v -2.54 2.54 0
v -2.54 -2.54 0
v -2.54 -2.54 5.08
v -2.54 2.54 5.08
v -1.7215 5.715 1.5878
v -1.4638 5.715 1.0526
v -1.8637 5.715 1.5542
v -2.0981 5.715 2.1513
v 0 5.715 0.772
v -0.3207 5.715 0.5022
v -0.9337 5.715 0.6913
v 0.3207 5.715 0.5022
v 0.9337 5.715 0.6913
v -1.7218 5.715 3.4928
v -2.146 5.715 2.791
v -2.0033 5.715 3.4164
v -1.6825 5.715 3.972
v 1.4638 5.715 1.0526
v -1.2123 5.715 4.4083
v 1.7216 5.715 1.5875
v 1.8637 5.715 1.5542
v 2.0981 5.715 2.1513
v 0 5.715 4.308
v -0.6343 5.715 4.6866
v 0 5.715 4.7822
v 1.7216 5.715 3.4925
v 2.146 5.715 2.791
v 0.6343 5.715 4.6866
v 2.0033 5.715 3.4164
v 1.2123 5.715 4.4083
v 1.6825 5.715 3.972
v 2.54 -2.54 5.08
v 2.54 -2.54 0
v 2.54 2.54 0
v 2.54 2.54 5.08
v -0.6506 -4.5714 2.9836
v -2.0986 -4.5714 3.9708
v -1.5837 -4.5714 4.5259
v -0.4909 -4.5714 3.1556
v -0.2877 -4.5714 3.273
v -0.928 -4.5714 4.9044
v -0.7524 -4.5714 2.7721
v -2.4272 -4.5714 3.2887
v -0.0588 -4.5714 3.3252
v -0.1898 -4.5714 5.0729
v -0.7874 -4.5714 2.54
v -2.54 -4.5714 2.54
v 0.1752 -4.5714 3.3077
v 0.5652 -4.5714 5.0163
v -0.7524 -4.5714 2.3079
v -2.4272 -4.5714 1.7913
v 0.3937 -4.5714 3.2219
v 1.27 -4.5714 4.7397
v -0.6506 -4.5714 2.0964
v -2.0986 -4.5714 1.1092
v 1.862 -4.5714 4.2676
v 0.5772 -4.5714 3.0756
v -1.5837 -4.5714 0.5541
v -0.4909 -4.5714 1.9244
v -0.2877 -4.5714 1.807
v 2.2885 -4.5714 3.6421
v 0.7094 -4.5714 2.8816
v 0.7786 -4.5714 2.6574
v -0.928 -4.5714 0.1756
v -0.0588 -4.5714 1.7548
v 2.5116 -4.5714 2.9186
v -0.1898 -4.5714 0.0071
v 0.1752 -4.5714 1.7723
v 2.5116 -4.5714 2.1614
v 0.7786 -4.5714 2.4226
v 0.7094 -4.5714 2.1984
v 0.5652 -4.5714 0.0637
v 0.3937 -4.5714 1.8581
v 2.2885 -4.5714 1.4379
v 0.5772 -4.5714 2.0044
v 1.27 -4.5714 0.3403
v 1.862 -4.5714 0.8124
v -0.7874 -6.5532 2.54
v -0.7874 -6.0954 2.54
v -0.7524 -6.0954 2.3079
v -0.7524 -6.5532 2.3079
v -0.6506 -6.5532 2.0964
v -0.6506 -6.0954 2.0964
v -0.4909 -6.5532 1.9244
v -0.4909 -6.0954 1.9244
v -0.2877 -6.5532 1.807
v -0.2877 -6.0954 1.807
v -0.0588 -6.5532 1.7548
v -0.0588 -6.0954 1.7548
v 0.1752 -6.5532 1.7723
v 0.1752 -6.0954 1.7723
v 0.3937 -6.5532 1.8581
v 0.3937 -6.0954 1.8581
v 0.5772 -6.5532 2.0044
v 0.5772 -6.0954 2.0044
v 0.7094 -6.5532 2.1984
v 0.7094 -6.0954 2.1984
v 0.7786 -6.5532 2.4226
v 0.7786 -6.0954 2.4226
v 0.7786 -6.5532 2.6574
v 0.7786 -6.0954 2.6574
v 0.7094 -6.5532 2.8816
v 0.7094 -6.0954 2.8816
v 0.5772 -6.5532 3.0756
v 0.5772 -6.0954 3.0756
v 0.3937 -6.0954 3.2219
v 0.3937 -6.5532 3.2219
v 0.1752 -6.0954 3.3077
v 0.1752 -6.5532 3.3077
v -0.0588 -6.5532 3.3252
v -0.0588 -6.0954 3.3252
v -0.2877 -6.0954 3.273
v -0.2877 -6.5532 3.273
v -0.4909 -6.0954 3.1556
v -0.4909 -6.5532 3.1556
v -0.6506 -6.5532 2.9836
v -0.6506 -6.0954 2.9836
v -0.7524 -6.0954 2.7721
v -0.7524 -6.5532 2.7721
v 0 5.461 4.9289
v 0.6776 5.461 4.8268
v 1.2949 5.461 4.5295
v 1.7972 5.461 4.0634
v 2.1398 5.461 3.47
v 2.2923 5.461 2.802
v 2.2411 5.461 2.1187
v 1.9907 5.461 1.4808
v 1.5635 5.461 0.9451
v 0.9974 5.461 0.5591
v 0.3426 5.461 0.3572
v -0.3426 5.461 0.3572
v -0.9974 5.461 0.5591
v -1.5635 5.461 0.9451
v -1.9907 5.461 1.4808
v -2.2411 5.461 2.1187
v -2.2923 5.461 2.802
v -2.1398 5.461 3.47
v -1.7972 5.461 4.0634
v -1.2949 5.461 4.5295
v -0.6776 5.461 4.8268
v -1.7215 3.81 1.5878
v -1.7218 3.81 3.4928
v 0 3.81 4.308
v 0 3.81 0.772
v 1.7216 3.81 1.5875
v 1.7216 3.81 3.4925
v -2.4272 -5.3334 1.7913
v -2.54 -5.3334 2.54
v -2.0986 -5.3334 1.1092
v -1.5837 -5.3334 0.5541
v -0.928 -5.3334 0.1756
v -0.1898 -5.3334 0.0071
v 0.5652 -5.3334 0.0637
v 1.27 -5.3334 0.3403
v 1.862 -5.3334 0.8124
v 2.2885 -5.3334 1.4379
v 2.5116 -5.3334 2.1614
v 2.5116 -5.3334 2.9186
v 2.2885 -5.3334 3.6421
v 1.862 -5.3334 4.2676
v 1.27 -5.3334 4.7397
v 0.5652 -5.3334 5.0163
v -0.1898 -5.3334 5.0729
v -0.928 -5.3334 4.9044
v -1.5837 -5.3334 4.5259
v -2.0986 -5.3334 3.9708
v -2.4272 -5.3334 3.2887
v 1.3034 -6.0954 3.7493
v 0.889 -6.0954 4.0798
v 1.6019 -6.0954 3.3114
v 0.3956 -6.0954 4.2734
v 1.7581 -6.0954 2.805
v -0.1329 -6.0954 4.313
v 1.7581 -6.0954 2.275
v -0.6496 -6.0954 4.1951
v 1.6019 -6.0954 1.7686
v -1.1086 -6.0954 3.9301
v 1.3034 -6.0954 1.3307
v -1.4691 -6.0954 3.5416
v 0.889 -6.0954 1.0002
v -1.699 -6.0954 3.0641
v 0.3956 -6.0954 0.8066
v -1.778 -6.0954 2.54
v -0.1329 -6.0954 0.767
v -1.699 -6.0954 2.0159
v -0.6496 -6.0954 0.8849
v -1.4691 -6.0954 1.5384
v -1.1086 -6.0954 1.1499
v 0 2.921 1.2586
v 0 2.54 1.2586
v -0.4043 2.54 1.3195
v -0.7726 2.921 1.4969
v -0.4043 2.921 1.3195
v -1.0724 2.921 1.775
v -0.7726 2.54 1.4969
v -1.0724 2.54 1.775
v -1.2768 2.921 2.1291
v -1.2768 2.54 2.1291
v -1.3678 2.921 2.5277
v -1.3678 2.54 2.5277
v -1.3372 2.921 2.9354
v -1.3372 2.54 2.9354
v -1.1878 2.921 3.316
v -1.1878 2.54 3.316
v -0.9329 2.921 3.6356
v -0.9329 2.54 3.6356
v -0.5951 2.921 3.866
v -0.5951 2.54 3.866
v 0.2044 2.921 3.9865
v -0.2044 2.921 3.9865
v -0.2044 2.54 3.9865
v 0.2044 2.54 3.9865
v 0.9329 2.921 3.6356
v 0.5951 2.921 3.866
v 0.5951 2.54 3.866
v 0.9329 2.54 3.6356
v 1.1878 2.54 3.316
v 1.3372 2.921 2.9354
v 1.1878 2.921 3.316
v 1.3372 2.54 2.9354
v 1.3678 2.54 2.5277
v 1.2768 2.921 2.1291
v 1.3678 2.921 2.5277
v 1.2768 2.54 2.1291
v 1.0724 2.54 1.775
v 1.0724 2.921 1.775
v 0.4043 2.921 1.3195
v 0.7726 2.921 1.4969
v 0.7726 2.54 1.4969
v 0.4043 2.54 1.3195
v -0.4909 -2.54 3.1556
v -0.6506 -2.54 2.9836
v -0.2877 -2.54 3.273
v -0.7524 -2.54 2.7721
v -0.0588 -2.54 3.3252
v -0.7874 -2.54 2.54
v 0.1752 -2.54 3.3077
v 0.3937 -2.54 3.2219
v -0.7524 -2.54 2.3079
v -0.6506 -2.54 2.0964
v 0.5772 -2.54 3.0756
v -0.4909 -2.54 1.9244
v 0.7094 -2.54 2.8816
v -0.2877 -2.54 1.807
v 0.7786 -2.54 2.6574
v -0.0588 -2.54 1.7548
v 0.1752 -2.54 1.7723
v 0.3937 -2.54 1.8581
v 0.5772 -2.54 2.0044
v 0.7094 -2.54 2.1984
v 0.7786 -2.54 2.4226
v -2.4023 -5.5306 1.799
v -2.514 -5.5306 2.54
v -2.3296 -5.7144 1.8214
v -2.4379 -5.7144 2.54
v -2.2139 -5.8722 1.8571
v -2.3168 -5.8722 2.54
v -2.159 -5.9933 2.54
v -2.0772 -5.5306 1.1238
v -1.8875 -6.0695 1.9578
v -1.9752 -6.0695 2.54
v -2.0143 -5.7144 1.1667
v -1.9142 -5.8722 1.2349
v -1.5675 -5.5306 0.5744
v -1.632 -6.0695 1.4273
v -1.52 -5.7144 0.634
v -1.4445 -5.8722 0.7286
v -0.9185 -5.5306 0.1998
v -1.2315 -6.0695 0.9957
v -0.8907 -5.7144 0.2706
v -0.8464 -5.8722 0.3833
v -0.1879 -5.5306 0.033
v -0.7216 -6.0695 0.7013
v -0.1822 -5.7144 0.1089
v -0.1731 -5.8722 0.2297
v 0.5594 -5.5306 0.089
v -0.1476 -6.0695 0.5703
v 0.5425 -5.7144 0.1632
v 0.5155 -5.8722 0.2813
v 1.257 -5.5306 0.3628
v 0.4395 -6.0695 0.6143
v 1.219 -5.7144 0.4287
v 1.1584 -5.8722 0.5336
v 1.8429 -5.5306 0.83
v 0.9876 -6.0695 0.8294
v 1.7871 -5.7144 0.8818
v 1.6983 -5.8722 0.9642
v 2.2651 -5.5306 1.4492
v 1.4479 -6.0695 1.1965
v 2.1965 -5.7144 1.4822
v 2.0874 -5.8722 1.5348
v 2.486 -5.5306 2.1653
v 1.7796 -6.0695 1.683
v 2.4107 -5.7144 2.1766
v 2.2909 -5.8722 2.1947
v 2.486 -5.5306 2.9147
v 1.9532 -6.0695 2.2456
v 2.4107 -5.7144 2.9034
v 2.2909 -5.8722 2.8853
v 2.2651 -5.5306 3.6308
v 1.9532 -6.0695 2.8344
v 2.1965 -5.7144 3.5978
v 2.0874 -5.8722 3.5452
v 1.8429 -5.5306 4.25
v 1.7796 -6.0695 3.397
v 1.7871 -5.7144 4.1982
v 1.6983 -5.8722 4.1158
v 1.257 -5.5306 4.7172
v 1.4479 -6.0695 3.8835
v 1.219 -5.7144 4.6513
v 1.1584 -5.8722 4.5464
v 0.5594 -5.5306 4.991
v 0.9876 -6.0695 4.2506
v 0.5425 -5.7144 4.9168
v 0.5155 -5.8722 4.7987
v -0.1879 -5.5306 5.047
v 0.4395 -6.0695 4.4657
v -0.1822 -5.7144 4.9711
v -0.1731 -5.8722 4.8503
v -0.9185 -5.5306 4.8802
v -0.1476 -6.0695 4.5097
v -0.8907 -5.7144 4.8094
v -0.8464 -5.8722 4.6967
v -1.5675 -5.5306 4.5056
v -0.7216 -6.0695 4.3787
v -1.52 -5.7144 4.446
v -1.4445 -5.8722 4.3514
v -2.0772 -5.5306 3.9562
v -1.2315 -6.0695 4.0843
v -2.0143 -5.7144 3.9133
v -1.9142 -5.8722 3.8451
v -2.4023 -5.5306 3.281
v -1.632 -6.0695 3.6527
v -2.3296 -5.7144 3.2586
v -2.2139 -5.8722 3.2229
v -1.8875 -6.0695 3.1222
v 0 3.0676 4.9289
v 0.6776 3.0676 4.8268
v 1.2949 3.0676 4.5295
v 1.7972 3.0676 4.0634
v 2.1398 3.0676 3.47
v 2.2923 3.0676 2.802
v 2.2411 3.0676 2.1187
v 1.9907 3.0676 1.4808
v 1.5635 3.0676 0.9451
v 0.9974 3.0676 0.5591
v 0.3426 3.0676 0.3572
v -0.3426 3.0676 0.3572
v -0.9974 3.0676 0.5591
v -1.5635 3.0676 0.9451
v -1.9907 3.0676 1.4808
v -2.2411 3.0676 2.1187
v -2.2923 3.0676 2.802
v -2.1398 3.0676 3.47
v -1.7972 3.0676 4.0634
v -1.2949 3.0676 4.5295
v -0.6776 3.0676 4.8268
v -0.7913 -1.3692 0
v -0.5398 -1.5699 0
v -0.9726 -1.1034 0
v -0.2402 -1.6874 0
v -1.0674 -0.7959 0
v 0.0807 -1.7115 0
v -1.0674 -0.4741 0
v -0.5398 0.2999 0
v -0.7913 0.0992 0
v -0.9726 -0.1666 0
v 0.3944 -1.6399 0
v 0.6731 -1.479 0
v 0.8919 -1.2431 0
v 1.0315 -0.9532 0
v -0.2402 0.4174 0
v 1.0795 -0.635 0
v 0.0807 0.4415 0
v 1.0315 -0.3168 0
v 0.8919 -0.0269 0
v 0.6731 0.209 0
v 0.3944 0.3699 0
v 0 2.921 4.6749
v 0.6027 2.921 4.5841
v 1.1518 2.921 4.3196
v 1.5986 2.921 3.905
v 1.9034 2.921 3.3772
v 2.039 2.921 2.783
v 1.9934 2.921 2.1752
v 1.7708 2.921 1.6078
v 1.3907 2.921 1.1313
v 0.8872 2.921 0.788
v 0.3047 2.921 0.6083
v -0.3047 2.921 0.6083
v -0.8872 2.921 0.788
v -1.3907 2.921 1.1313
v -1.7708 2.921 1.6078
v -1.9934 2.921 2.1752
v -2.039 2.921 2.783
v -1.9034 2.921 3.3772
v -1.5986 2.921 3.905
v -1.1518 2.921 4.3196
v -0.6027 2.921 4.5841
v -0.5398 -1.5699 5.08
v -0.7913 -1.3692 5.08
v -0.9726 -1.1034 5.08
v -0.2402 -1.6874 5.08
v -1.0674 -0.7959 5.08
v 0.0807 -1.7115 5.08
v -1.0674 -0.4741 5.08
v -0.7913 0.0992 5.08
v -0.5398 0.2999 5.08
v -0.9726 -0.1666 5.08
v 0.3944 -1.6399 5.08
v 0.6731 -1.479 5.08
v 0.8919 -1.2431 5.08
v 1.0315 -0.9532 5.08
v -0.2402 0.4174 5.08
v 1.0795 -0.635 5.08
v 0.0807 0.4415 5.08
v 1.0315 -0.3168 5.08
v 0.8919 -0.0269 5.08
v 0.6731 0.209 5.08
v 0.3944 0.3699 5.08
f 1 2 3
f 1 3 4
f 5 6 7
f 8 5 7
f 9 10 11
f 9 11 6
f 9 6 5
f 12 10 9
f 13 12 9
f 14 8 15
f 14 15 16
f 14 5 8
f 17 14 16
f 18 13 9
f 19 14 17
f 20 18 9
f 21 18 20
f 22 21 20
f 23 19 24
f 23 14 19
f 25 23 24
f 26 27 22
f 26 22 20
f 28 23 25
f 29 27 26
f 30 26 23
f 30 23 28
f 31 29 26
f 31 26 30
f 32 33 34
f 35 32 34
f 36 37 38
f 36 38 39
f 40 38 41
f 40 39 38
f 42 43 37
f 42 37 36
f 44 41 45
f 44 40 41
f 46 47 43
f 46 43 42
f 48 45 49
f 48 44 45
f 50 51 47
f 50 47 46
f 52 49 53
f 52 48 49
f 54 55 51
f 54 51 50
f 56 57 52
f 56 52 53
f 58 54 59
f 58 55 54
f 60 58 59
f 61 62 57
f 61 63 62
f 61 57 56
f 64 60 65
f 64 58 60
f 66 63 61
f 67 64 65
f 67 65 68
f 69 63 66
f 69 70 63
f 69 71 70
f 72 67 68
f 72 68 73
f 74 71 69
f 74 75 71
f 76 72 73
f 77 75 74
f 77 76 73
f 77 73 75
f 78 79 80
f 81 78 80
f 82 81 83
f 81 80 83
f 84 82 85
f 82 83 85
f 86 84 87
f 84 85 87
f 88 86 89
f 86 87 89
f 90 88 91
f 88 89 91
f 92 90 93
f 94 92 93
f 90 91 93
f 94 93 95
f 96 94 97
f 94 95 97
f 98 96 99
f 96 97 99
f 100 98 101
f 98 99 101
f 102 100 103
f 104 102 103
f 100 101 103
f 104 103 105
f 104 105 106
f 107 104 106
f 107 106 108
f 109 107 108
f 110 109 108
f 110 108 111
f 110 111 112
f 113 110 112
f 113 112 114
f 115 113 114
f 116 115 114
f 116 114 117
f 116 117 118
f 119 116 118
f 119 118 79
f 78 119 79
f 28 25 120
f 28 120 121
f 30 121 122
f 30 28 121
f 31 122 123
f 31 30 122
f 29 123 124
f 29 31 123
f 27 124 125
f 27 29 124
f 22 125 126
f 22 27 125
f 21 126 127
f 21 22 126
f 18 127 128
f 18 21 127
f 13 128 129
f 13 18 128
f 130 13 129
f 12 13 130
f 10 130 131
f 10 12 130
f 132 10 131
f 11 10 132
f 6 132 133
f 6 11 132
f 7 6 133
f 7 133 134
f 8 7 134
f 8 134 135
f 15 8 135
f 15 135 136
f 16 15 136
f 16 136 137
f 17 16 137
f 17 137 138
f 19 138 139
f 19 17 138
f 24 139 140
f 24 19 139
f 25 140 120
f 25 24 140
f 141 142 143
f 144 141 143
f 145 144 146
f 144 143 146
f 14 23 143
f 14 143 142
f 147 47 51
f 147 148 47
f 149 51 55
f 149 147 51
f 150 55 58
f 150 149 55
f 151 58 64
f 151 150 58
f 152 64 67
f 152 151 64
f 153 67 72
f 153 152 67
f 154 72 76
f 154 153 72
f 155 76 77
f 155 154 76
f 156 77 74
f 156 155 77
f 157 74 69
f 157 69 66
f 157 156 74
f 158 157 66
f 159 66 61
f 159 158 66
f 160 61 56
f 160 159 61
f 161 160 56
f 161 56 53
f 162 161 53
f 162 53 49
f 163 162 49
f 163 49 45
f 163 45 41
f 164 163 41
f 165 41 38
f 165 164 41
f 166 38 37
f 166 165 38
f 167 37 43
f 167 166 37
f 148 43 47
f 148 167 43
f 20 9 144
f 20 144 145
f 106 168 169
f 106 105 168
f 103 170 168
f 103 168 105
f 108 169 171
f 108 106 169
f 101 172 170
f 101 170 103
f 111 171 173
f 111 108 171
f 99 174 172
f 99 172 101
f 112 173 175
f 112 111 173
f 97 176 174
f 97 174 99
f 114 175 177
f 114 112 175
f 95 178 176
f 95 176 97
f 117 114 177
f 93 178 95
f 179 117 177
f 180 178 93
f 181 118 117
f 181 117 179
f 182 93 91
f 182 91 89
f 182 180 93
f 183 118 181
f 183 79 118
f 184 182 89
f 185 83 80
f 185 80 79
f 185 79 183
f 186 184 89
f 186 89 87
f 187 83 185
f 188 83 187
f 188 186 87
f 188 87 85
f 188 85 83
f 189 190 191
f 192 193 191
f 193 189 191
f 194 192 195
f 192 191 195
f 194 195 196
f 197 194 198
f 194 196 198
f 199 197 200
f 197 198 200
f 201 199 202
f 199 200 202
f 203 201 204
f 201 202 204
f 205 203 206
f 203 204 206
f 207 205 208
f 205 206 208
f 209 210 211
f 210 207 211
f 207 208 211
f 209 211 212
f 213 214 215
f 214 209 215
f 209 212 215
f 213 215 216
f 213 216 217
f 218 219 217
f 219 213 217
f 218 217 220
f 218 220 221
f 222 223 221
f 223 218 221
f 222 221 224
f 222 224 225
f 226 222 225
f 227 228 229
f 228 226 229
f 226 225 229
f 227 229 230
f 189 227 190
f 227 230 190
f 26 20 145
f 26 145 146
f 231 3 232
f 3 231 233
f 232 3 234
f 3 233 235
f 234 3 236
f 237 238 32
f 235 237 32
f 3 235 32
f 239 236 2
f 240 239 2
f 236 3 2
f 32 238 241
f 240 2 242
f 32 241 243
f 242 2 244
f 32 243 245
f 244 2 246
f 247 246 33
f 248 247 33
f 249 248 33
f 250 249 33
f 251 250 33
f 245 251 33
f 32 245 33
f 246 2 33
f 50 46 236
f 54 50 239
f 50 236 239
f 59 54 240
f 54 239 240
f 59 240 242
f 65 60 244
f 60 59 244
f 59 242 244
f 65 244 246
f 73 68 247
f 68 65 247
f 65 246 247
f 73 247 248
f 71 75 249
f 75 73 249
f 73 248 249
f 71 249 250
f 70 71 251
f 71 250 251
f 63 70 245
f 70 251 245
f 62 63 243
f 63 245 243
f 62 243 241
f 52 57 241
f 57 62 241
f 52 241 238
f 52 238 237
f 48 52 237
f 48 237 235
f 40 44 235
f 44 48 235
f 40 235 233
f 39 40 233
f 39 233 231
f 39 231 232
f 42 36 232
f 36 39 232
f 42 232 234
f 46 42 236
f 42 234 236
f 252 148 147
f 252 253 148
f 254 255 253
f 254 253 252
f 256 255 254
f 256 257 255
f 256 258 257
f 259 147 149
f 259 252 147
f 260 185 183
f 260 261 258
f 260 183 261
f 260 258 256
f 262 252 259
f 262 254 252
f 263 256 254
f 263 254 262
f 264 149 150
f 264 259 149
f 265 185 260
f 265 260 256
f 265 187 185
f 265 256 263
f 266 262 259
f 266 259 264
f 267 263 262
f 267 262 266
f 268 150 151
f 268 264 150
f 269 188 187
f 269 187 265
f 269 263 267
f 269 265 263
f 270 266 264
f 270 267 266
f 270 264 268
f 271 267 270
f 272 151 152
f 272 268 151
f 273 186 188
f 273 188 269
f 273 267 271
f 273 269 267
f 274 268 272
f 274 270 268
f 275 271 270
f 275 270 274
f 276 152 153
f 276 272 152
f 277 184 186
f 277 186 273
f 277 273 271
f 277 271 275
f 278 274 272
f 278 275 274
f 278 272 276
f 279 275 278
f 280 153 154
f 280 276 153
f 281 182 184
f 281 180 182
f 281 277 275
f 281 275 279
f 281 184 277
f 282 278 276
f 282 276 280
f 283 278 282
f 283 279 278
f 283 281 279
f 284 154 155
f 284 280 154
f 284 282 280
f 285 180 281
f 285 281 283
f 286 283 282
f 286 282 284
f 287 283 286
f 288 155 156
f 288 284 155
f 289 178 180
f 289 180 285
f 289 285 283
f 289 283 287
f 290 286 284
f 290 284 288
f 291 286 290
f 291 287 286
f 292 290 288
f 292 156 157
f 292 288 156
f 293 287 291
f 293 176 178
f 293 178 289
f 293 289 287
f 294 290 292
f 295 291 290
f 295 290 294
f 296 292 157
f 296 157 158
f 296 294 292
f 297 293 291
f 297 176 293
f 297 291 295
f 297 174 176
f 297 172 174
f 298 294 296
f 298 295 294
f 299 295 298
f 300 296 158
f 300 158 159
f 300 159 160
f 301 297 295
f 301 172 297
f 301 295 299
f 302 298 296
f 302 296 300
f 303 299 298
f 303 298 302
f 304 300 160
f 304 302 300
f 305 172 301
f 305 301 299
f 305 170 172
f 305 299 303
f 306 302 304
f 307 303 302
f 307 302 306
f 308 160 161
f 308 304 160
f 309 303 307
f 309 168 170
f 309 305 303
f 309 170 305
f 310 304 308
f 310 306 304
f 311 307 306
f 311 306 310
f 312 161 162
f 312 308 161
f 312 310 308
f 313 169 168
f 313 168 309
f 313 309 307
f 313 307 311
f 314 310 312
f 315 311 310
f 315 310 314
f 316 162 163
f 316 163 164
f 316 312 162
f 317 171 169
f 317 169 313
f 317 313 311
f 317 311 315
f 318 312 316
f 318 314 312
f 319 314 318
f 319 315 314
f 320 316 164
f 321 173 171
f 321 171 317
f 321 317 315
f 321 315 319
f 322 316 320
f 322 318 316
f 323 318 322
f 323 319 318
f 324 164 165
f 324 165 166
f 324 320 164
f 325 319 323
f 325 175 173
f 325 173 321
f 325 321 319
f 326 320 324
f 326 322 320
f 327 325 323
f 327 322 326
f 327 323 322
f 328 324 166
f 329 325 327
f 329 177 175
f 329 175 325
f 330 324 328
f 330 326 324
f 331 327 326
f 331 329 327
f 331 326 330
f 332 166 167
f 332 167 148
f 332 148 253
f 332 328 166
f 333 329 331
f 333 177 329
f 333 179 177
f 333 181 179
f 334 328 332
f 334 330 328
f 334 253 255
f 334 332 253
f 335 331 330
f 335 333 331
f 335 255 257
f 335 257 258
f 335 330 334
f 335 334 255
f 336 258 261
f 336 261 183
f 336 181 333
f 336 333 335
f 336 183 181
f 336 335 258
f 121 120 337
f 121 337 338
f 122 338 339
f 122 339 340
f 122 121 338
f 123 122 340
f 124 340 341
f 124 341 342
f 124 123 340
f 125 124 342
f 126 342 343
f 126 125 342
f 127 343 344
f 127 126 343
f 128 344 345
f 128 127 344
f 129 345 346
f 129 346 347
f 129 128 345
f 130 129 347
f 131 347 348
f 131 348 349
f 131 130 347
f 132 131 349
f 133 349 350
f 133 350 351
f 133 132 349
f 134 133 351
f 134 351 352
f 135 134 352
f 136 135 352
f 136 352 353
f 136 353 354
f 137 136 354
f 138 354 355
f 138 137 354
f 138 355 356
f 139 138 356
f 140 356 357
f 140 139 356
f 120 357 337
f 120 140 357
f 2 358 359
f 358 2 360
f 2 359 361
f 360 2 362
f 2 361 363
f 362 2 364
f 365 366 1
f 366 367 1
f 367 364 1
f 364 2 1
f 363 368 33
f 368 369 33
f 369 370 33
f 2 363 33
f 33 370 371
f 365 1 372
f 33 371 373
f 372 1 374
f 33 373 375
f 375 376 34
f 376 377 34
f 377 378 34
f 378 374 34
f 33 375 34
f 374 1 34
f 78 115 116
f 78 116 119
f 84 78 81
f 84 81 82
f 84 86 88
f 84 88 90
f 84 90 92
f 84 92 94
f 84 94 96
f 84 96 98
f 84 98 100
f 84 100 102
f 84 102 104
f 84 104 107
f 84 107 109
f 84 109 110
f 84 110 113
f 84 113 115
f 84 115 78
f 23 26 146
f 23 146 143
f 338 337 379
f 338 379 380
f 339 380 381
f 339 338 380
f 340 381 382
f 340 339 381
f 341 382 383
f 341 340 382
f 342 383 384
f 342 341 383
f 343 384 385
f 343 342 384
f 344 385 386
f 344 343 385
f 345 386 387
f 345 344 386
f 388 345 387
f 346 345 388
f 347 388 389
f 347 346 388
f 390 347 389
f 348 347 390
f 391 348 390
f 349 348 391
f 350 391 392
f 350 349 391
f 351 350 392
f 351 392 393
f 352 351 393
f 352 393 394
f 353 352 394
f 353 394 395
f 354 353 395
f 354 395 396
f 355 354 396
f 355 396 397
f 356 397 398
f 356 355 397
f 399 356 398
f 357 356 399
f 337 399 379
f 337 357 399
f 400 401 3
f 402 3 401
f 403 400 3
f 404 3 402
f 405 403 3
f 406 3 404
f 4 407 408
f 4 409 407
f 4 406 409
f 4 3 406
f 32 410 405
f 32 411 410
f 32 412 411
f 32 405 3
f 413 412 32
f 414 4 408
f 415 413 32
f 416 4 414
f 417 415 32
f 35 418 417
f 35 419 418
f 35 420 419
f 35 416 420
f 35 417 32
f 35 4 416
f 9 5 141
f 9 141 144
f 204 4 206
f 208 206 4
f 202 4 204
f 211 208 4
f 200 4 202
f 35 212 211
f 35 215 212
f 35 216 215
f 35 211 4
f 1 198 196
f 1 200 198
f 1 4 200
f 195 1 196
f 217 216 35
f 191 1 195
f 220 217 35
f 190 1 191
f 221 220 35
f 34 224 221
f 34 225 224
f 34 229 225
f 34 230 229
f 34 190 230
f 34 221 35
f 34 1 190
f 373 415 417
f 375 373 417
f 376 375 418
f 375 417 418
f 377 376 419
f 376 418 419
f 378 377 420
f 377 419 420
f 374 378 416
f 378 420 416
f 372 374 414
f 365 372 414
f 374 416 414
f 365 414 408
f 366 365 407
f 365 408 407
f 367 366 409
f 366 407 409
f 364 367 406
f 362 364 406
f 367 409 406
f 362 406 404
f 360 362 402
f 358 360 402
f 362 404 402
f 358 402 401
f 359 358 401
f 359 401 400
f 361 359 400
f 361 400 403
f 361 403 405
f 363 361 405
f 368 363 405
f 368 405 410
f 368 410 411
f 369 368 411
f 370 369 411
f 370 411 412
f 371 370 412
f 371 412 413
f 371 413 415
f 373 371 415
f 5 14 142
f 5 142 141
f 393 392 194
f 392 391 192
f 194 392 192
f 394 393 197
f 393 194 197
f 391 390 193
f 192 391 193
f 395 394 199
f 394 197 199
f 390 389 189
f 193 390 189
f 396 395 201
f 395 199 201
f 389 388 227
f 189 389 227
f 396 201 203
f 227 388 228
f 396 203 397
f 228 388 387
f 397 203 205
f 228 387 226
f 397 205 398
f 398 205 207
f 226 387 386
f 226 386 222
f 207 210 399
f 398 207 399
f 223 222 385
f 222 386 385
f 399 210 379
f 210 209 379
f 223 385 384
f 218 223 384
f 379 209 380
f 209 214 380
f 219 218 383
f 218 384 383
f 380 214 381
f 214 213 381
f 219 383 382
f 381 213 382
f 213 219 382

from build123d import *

# Parameters (mm, degrees)
SKETCH1_W          = 5.08
SKETCH1_H          = 5.08
EXTRUDE1_DEPTH     = 5.08
SKETCH2_R          = 1.0795
CUT_EXTRUDE1_DEPTH = 7.221703947
SKETCH3_R          = 0.7874
EXTRUDE2_DEPTH     = 4.0132
SKETCH4_R          = 1.3716
EXTRUDE3_DEPTH     = 3.175
SKETCH5_R          = 2.2987
EXTRUDE4_DEPTH     = 2.794
CHAMFER1_SIZE      = 0.254
CHAMFER1_SIZE2     = 0.146646968
CUT_EXTRUDE2_DEPTH = 1.905
CHAMFER2_SIZE      = 0.254
CHAMFER2_SIZE2     = 0.146646968


with BuildPart() as part:
    # Sketch1 → Extrude1 (new body)
    with BuildSketch(Plane.XY):
        Rectangle(SKETCH1_W, SKETCH1_H)
    extrude(amount=EXTRUDE1_DEPTH)

    # Sketch2 → Cut-Extrude1 (cut, through all)
    with BuildSketch(Plane.XY.offset(5.08)):
        with Locations((0, -0.635)):
            Circle(SKETCH2_R)
    extrude(amount=-CUT_EXTRUDE1_DEPTH, mode=Mode.SUBTRACT)

    # Sketch3 → Extrude2 (add)
    with BuildSketch(Plane.XZ.offset(2.54)):
        with Locations(Location((0, 2.54, 0), (0, 0, 180))):
            Circle(SKETCH3_R)
    extrude(amount=EXTRUDE2_DEPTH)

    # Sketch4 → Extrude3 (add)
    with BuildSketch(Plane(origin=(0, 2.54, 0), x_dir=(-1, 0, 0), z_dir=(0, 1, 0))):
        with Locations(Location((0, 2.630194731, 0), (0, 0, 270))):
            Circle(SKETCH4_R)
    extrude(amount=EXTRUDE3_DEPTH)

    # Sketch5 → Extrude4 (add)
    with BuildSketch(Plane(origin=(0, 5.715, 0), x_dir=(-1, 0, 0), z_dir=(0, 1, 0))):
        with Locations(Location((0, 2.630194731, 0), (0, 0, 90))):
            Circle(SKETCH5_R)
    extrude(amount=-EXTRUDE4_DEPTH)

    # Chamfer1
    chamfer1_edges = [part.edges().sort_by_distance(p)[0] for p in [
        (0, 5.715, 0.331494731),
    ]]
    chamfer1_side = [part.faces().sort_by_distance(p)[0] for p in [
        (0, 4.318, 0.331494731),
    ]]
    chamfer(chamfer1_edges, length=CHAMFER1_SIZE, length2=CHAMFER1_SIZE2, reference=chamfer1_side[0])

    # Sketch6 → Cut-Extrude2 (cut)
    with BuildSketch(Plane(origin=(0, 5.715, 0), x_dir=(-1, 0, 0), z_dir=(0, 1, 0))):
        Polygon((-1.721618465, 1.5875), (-1.721618465, 3.4925), (0, 4.308008959), (1.721756789, 3.49279208), (1.72148007, 1.5877921), (0, 0.771991041), align=None)
    extrude(amount=-CUT_EXTRUDE2_DEPTH, mode=Mode.SUBTRACT)

    # Chamfer2
    chamfer2_edges = [part.edges().sort_by_distance(p)[0] for p in [
        (0, 2.921, 0.331494731),
    ]]
    chamfer2_side = [part.faces().sort_by_distance(p)[0] for p in [
        (0, 2.921, 0.396511785),
    ]]
    chamfer(chamfer2_edges, length=CHAMFER2_SIZE, length2=CHAMFER2_SIZE2, reference=chamfer2_side[0])

    # Sketch9 → Revolve1 (revolve)
    with BuildSketch(Plane(origin=(0, 0, -0.758383952), x_dir=(0, 0, 1), z_dir=(-1, 0, 0)), mode=Mode.PRIVATE) as revolve1_sk:
        with BuildLine():
            Line((3.298383952, -4.571424559), (0.758383952, -4.571424559))
            Line((0.758383952, -4.571424559), (0.758383952, -5.333424559))
            ThreePointArc((0.758383952, -5.333424559), (0.981568584, -5.872239927), (1.520383952, -6.095424559))
            Line((1.520383952, -6.095424559), (3.298383952, -6.095424559))
            Line((3.298383952, -6.095424559), (3.298383952, -4.571424559))
        make_face()
    revolve(revolve1_sk.sketch.rotate(Axis((0, -4.571424559, 2.54), (0, -1, 0)), 270), axis=Axis((0, -4.571424559, 2.54), (0, -1, 0)))


solid = part.part
